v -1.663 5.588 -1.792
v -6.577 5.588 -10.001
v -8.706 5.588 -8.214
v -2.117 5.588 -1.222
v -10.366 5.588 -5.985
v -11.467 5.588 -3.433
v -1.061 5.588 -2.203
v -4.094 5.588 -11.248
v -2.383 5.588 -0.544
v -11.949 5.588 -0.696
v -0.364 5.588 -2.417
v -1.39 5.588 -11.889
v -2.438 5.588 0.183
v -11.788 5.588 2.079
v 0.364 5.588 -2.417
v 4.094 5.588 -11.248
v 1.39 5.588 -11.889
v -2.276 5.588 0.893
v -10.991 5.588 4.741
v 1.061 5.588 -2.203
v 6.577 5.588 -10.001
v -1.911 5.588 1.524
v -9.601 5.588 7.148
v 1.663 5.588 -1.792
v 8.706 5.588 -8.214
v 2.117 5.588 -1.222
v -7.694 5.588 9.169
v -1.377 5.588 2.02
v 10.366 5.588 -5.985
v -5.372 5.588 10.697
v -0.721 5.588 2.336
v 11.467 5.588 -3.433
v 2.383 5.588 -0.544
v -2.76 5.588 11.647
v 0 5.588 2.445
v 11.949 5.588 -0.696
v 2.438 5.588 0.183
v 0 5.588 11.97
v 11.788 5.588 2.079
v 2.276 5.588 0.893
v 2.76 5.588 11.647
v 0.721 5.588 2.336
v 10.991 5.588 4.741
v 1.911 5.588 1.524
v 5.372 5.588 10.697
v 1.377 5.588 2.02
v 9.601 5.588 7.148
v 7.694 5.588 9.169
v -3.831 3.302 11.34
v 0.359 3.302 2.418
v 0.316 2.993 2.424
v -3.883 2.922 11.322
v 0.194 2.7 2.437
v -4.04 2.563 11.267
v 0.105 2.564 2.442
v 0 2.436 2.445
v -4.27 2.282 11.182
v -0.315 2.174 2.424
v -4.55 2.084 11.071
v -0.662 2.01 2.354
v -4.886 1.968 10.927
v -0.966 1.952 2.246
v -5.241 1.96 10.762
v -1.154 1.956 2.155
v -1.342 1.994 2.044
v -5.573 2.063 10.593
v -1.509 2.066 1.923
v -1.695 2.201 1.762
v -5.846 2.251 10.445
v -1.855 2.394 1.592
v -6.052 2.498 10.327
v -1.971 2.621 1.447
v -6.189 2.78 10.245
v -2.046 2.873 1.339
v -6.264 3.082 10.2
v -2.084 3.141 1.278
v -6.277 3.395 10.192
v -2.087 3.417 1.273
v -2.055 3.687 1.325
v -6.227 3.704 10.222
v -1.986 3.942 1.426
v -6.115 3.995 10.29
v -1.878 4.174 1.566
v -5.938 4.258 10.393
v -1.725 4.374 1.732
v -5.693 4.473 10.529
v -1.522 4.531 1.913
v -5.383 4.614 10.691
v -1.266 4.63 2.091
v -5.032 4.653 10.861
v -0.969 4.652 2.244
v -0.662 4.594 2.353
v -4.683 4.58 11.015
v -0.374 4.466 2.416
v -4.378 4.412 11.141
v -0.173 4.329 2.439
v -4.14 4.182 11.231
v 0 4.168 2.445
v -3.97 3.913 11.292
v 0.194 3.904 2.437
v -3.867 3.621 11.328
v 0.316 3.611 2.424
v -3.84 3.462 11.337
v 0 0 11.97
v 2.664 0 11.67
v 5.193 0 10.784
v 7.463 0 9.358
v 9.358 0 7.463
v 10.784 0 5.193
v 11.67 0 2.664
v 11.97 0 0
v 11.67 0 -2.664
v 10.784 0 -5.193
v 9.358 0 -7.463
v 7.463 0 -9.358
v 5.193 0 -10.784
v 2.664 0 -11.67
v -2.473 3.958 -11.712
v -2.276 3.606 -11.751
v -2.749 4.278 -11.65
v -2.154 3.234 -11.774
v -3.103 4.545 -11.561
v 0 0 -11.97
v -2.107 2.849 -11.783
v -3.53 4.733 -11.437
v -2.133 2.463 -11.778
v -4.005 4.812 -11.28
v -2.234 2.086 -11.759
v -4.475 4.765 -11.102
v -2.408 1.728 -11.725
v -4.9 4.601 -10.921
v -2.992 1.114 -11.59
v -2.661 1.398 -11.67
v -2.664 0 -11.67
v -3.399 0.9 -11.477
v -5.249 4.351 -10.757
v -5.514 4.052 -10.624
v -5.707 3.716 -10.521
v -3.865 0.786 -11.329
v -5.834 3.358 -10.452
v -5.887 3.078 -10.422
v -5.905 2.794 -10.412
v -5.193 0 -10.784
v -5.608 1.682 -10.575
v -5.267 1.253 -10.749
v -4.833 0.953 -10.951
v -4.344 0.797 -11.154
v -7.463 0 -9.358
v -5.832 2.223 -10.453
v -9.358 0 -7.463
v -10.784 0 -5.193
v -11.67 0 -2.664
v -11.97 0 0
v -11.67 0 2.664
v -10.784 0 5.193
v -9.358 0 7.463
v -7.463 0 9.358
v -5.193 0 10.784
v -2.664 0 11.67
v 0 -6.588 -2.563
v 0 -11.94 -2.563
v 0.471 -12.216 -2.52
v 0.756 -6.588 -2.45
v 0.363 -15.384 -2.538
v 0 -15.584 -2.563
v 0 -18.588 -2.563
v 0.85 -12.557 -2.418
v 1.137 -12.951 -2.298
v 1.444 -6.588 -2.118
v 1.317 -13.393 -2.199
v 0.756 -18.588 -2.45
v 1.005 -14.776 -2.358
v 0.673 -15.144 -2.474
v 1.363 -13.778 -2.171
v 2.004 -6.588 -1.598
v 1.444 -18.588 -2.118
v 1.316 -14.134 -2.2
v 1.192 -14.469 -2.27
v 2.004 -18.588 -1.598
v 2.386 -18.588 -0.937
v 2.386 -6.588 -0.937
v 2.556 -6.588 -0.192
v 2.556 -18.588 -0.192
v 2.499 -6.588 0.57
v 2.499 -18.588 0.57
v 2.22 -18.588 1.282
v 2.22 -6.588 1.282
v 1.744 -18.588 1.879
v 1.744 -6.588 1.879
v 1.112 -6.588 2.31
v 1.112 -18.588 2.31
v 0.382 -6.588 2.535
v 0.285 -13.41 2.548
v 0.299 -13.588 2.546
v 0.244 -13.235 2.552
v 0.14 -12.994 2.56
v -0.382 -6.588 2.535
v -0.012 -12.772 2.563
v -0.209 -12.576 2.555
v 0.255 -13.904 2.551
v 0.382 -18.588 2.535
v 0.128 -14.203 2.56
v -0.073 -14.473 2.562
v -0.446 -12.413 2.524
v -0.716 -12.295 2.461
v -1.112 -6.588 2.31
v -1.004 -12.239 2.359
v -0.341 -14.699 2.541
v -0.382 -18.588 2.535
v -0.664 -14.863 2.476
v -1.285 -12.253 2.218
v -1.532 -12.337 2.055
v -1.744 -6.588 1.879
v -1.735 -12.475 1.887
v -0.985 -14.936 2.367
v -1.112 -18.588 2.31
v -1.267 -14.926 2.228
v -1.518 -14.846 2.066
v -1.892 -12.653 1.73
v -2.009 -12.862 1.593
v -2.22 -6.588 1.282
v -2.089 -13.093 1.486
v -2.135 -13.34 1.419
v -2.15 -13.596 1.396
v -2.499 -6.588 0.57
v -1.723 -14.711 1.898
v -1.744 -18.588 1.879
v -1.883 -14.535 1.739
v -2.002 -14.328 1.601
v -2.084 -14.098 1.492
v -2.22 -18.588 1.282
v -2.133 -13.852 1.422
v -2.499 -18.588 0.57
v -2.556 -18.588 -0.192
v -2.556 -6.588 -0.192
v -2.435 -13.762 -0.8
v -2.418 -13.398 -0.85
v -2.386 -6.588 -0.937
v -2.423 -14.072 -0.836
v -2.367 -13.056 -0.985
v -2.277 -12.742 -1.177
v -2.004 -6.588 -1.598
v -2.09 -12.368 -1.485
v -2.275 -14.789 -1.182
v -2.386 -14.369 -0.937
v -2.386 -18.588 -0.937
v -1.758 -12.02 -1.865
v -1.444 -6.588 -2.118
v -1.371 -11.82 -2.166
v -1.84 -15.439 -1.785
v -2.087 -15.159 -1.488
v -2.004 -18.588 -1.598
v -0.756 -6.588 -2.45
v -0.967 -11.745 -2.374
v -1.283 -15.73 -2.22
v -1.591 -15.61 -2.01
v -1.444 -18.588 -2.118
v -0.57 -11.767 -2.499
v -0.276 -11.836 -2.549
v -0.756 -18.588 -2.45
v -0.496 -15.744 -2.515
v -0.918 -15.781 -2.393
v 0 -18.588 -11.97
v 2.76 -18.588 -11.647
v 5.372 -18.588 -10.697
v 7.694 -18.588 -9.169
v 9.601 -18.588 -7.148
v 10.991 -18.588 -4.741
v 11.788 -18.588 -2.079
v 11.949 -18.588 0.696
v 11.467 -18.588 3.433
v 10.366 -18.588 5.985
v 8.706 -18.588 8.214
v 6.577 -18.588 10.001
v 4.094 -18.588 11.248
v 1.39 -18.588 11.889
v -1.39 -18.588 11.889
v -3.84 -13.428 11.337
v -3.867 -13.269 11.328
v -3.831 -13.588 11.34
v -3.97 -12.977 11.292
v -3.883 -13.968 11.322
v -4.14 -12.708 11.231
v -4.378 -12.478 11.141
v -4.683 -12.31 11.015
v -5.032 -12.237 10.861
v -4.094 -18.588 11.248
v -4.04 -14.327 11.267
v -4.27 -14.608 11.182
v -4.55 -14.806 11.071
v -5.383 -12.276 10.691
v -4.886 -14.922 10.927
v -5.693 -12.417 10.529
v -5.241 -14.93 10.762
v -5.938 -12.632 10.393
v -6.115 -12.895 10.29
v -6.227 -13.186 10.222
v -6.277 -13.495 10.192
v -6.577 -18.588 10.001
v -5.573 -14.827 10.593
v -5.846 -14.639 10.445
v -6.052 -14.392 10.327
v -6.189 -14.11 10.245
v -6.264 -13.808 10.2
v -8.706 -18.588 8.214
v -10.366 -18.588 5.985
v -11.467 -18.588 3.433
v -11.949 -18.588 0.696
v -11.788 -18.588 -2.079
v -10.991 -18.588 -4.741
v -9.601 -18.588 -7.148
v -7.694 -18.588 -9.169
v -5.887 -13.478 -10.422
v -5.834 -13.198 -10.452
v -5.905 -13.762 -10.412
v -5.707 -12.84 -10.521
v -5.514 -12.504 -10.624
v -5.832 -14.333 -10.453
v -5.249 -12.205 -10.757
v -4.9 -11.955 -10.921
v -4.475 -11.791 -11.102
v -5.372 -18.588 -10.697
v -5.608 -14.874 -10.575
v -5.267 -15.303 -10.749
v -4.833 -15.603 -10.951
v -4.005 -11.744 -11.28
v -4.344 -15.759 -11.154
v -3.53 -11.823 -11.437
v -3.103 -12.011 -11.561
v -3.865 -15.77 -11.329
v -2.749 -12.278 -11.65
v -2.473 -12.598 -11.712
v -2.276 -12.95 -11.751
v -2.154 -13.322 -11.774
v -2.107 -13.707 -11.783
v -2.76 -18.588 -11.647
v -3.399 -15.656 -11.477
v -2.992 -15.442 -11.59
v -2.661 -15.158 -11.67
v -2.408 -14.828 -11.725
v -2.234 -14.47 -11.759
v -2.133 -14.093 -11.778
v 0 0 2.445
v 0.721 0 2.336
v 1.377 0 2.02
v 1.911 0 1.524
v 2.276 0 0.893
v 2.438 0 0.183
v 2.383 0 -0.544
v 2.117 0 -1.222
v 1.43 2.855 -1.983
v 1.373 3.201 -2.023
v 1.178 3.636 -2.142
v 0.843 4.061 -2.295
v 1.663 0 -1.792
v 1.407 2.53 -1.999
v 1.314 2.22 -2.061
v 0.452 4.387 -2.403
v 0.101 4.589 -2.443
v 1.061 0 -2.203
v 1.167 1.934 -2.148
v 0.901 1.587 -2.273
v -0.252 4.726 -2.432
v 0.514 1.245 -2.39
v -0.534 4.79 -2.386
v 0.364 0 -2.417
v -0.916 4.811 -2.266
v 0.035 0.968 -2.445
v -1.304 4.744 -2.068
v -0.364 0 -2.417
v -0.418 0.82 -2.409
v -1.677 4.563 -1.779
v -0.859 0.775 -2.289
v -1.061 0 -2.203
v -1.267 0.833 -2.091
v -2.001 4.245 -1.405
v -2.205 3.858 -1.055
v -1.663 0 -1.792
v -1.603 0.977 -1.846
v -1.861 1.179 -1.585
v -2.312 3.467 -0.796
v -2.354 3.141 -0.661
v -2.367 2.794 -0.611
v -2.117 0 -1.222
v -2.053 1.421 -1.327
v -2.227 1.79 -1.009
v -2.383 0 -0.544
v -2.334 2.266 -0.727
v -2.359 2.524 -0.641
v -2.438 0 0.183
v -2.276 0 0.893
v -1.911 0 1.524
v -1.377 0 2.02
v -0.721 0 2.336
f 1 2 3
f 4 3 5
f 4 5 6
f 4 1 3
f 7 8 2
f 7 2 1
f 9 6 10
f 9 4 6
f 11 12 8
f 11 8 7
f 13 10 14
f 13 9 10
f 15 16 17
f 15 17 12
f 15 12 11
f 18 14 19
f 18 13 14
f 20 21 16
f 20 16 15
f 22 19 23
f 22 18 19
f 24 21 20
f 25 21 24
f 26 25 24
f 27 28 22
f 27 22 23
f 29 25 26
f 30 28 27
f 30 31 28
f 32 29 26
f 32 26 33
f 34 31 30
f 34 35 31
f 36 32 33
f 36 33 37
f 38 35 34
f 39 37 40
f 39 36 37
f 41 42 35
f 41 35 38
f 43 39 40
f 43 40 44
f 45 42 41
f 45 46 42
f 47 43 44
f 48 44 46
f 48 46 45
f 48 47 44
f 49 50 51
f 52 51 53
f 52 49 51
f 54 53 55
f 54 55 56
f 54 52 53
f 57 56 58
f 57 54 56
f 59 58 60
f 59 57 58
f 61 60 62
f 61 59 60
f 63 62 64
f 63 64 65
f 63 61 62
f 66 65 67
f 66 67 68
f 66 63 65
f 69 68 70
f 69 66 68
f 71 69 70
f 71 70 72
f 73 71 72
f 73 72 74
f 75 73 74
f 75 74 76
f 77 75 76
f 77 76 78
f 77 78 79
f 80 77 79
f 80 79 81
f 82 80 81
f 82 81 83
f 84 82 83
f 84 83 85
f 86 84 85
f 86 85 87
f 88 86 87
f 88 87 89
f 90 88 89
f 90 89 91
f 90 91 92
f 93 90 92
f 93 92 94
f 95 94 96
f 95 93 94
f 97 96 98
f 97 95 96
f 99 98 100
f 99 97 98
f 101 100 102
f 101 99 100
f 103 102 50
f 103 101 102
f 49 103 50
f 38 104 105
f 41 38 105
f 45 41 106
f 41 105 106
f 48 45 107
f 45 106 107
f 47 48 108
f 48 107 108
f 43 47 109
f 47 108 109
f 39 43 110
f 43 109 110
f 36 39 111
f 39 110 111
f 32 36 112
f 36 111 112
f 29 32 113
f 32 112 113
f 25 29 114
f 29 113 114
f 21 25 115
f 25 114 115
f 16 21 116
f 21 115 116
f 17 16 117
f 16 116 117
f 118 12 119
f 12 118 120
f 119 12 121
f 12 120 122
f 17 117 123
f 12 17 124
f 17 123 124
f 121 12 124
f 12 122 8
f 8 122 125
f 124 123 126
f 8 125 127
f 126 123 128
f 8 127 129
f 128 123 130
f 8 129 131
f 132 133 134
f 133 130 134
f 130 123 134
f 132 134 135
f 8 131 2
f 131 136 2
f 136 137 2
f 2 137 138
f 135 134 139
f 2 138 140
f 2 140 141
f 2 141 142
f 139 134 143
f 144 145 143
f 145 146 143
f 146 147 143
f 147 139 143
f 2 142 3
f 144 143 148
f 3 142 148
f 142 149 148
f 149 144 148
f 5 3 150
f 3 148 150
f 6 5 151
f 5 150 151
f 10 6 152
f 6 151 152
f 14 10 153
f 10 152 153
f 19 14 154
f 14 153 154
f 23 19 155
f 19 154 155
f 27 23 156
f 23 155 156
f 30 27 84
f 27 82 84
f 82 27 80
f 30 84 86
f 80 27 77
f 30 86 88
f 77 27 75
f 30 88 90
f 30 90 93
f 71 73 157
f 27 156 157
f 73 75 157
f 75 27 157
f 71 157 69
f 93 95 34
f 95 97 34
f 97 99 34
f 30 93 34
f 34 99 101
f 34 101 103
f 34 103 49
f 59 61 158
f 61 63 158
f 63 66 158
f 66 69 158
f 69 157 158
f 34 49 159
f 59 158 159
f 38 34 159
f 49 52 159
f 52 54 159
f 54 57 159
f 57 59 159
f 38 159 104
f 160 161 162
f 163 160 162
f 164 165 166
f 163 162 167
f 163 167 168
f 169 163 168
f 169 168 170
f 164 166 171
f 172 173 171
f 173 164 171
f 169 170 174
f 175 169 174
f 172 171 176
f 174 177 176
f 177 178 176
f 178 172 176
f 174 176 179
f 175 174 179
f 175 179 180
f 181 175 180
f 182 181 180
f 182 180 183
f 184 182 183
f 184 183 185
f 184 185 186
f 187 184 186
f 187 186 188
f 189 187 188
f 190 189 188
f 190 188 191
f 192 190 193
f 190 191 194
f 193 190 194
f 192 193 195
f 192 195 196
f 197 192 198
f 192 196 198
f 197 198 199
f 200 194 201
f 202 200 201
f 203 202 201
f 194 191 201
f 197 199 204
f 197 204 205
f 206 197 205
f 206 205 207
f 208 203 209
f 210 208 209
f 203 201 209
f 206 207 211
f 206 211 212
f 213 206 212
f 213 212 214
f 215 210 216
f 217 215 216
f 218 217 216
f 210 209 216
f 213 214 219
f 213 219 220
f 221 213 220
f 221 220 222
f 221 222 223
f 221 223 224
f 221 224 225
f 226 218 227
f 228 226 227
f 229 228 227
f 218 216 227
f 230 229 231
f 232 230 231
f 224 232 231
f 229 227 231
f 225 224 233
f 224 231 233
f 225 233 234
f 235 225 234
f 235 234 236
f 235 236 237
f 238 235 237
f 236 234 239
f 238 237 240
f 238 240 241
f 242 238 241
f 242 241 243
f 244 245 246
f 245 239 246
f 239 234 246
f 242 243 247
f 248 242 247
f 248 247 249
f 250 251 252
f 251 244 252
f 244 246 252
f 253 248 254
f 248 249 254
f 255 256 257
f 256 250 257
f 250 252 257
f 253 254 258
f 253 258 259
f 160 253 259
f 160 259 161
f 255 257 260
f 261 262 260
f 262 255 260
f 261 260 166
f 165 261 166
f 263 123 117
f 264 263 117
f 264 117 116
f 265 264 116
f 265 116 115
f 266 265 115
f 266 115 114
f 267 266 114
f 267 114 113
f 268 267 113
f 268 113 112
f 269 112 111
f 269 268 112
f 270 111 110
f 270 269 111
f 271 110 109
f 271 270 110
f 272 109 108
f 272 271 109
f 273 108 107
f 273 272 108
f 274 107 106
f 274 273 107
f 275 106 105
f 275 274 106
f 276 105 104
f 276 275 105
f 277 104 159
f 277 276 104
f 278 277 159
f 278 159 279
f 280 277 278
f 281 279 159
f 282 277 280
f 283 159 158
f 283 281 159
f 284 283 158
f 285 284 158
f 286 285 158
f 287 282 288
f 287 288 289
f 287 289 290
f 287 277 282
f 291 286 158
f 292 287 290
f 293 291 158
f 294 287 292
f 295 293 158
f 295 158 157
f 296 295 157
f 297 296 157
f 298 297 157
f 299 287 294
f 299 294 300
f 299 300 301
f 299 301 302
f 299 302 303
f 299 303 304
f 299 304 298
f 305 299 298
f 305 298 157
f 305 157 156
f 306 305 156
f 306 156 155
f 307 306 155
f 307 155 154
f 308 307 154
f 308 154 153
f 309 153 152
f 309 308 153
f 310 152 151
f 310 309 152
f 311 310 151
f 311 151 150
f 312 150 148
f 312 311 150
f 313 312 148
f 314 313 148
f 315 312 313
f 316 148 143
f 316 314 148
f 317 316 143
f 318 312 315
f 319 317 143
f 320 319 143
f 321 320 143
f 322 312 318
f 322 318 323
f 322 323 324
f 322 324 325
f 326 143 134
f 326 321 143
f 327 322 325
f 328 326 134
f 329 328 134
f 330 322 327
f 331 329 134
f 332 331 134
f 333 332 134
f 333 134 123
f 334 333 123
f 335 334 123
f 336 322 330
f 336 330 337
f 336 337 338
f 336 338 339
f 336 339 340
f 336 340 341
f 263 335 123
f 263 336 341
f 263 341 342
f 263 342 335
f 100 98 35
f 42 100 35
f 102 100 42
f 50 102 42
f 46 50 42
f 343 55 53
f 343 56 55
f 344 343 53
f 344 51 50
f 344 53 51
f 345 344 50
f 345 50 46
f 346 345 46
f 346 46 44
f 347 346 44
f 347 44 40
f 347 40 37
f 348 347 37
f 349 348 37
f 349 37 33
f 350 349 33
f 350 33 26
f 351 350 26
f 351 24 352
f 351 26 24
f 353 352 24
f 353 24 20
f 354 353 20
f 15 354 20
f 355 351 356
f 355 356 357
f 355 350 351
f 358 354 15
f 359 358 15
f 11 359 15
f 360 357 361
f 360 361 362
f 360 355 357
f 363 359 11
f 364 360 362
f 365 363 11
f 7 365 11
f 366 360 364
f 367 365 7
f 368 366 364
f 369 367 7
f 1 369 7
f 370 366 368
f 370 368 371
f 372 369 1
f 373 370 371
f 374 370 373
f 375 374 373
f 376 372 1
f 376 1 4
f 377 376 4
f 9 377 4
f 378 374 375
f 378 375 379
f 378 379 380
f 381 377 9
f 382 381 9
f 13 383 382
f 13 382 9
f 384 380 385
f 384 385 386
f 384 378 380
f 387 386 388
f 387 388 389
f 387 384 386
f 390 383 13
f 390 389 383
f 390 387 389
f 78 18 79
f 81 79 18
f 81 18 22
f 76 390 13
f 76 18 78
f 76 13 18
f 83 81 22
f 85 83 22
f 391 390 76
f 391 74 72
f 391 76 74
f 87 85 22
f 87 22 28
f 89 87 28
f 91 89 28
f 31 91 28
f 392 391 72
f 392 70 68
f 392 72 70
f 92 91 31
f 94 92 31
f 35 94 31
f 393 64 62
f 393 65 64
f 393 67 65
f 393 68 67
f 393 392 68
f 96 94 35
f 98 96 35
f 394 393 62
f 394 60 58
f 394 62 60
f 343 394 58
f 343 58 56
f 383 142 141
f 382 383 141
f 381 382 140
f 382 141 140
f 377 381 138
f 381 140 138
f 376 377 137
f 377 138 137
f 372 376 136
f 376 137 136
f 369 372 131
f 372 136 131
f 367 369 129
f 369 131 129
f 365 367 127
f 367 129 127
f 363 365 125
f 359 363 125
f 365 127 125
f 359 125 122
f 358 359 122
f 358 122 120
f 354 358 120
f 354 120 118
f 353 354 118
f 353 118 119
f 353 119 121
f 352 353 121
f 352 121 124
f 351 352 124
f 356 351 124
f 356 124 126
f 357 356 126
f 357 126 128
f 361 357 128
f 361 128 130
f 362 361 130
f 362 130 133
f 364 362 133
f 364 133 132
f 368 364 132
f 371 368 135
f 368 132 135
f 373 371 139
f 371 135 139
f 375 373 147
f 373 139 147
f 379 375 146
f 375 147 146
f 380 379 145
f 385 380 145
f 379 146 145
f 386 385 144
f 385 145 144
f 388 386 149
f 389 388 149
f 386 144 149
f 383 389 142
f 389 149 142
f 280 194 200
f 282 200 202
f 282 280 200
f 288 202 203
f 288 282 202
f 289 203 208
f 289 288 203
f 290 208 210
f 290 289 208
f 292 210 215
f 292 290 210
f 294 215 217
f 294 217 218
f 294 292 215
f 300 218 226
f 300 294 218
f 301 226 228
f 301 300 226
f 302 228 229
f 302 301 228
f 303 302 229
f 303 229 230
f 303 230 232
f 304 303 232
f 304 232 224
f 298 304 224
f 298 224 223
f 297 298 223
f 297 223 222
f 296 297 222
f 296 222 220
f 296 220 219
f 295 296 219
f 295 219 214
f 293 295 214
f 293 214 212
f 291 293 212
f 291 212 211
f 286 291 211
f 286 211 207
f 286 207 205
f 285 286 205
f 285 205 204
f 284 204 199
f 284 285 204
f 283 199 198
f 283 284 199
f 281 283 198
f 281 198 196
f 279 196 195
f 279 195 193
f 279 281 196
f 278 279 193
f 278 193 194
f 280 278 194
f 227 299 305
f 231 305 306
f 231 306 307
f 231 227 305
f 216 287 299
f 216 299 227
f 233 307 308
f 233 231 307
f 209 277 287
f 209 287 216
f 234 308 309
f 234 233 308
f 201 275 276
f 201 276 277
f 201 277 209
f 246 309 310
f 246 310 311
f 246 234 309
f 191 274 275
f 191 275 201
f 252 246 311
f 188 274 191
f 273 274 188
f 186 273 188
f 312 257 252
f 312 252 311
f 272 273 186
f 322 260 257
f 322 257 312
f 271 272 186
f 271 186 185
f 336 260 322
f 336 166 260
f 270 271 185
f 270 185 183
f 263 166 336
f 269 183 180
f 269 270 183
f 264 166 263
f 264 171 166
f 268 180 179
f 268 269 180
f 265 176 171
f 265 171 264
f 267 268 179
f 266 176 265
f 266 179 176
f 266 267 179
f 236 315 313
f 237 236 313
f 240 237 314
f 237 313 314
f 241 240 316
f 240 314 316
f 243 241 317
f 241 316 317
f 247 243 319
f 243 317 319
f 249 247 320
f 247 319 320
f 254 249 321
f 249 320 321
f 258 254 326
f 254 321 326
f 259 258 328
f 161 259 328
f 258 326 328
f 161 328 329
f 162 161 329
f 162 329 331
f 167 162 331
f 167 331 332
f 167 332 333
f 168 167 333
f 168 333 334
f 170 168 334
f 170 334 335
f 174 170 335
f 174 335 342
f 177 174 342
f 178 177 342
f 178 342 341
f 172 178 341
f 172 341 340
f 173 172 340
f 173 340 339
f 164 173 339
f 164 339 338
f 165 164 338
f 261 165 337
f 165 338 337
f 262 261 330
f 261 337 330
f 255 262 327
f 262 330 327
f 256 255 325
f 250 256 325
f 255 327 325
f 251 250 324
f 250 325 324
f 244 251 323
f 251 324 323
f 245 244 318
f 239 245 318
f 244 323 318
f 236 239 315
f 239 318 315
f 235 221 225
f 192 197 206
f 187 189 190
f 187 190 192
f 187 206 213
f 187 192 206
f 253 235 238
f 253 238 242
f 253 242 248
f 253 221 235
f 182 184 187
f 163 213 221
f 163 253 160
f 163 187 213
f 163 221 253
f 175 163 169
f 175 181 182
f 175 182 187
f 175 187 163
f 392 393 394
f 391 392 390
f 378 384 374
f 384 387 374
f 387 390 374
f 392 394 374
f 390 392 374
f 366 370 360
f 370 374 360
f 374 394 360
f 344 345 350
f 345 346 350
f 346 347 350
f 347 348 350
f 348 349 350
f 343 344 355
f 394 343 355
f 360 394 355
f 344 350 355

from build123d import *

# Parameters (mm, degrees)
SKETCH2_R               = 11.96975
SKETCH2_R_2             = 2.44475
BOSS_EXTRUDE1_DEPTH     = 5.588
CUT_EXTRUDE1_DEPTH      = 2.54
CUT_EXTRUDE1_DEPTH_BACK = 15
SKETCH3_R               = 1.35255
BOSS_EXTRUDE2_START     = 18.588
SKETCH4_R               = 11.96975
BOSS_EXTRUDE2_DEPTH     = 18.588
SKETCH5_R               = 2.563495
CUT_EXTRUDE3_DEPTH      = 12
CUT_EXTRUDE4_DEPTH      = 1.27
CUT_EXTRUDE4_DEPTH_BACK = 12.446
SKETCH6_R               = 1.35255
SKETCH10_R              = 2.0193
CUT_EXTRUDE6_DEPTH      = 11.43


with BuildPart() as part:
    # Sketch2 → Boss-Extrude1 (new body)
    with BuildSketch(Plane(origin=(0, 0, 0), x_dir=(1, 0, 0), z_dir=(0, 1, 0))):
        Circle(SKETCH2_R)
        Circle(SKETCH2_R_2, mode=Mode.SUBTRACT)
    extrude(amount=BOSS_EXTRUDE1_DEPTH)

    # Sketch3 → Cut-Extrude1 (cut, two sides: drawn at the far end of the back side and taken through both)
    with BuildSketch(Plane(origin=(-1.039168295, 0, 2.212901222), x_dir=(-0.9051646270437873, 0, -0.425061169655241), z_dir=(0.425061169655241, 0, -0.9051646270437873)).offset(-CUT_EXTRUDE1_DEPTH_BACK)):
        with Locations((0, 3.302)):
            Circle(SKETCH3_R)
    extrude(amount=CUT_EXTRUDE1_DEPTH + CUT_EXTRUDE1_DEPTH_BACK, mode=Mode.SUBTRACT)

    # Sketch4 → Boss-Extrude2 (add)
    with BuildSketch(Plane(origin=(0, 0, 0), x_dir=(-1, 0, 0), z_dir=(0, -1, 0)).offset(BOSS_EXTRUDE2_START)):
        Circle(SKETCH4_R)
    extrude(amount=-BOSS_EXTRUDE2_DEPTH)

    # Sketch5 → Cut-Extrude3 (cut)
    with BuildSketch(Plane(origin=(0, -18.588, 0), x_dir=(-1, 0, 0), z_dir=(0, -1, 0))):
        Circle(SKETCH5_R)
    extrude(amount=-CUT_EXTRUDE3_DEPTH, mode=Mode.SUBTRACT)

    # Sketch6 → Cut-Extrude4 (cut, two sides: drawn at the far end of the back side and taken through both)
    with BuildSketch(Plane(origin=(-1.039168295, 0, 2.212901222), x_dir=(-0.9051646270437873, 0, -0.425061169655241), z_dir=(0.425061169655241, 0, -0.9051646270437873)).offset(-CUT_EXTRUDE4_DEPTH_BACK)):
        with Locations((0, -13.588)):
            Circle(SKETCH6_R)
    extrude(amount=CUT_EXTRUDE4_DEPTH + CUT_EXTRUDE4_DEPTH_BACK, mode=Mode.SUBTRACT)

    # Sketch10 → Cut-Extrude6 (cut)
    with BuildSketch(Plane(origin=(-4.063543521, 0, -11.258886673), x_dir=(0, -1, 0), z_dir=(-0.3394844103905428, 0, -0.9406116813551624))):
        with Locations((13.762, 0)):
            Circle(SKETCH10_R)
        with Locations((-2.794, 0)):
            Circle(SKETCH10_R)
    extrude(amount=-CUT_EXTRUDE6_DEPTH, mode=Mode.SUBTRACT)


solid = part.part
